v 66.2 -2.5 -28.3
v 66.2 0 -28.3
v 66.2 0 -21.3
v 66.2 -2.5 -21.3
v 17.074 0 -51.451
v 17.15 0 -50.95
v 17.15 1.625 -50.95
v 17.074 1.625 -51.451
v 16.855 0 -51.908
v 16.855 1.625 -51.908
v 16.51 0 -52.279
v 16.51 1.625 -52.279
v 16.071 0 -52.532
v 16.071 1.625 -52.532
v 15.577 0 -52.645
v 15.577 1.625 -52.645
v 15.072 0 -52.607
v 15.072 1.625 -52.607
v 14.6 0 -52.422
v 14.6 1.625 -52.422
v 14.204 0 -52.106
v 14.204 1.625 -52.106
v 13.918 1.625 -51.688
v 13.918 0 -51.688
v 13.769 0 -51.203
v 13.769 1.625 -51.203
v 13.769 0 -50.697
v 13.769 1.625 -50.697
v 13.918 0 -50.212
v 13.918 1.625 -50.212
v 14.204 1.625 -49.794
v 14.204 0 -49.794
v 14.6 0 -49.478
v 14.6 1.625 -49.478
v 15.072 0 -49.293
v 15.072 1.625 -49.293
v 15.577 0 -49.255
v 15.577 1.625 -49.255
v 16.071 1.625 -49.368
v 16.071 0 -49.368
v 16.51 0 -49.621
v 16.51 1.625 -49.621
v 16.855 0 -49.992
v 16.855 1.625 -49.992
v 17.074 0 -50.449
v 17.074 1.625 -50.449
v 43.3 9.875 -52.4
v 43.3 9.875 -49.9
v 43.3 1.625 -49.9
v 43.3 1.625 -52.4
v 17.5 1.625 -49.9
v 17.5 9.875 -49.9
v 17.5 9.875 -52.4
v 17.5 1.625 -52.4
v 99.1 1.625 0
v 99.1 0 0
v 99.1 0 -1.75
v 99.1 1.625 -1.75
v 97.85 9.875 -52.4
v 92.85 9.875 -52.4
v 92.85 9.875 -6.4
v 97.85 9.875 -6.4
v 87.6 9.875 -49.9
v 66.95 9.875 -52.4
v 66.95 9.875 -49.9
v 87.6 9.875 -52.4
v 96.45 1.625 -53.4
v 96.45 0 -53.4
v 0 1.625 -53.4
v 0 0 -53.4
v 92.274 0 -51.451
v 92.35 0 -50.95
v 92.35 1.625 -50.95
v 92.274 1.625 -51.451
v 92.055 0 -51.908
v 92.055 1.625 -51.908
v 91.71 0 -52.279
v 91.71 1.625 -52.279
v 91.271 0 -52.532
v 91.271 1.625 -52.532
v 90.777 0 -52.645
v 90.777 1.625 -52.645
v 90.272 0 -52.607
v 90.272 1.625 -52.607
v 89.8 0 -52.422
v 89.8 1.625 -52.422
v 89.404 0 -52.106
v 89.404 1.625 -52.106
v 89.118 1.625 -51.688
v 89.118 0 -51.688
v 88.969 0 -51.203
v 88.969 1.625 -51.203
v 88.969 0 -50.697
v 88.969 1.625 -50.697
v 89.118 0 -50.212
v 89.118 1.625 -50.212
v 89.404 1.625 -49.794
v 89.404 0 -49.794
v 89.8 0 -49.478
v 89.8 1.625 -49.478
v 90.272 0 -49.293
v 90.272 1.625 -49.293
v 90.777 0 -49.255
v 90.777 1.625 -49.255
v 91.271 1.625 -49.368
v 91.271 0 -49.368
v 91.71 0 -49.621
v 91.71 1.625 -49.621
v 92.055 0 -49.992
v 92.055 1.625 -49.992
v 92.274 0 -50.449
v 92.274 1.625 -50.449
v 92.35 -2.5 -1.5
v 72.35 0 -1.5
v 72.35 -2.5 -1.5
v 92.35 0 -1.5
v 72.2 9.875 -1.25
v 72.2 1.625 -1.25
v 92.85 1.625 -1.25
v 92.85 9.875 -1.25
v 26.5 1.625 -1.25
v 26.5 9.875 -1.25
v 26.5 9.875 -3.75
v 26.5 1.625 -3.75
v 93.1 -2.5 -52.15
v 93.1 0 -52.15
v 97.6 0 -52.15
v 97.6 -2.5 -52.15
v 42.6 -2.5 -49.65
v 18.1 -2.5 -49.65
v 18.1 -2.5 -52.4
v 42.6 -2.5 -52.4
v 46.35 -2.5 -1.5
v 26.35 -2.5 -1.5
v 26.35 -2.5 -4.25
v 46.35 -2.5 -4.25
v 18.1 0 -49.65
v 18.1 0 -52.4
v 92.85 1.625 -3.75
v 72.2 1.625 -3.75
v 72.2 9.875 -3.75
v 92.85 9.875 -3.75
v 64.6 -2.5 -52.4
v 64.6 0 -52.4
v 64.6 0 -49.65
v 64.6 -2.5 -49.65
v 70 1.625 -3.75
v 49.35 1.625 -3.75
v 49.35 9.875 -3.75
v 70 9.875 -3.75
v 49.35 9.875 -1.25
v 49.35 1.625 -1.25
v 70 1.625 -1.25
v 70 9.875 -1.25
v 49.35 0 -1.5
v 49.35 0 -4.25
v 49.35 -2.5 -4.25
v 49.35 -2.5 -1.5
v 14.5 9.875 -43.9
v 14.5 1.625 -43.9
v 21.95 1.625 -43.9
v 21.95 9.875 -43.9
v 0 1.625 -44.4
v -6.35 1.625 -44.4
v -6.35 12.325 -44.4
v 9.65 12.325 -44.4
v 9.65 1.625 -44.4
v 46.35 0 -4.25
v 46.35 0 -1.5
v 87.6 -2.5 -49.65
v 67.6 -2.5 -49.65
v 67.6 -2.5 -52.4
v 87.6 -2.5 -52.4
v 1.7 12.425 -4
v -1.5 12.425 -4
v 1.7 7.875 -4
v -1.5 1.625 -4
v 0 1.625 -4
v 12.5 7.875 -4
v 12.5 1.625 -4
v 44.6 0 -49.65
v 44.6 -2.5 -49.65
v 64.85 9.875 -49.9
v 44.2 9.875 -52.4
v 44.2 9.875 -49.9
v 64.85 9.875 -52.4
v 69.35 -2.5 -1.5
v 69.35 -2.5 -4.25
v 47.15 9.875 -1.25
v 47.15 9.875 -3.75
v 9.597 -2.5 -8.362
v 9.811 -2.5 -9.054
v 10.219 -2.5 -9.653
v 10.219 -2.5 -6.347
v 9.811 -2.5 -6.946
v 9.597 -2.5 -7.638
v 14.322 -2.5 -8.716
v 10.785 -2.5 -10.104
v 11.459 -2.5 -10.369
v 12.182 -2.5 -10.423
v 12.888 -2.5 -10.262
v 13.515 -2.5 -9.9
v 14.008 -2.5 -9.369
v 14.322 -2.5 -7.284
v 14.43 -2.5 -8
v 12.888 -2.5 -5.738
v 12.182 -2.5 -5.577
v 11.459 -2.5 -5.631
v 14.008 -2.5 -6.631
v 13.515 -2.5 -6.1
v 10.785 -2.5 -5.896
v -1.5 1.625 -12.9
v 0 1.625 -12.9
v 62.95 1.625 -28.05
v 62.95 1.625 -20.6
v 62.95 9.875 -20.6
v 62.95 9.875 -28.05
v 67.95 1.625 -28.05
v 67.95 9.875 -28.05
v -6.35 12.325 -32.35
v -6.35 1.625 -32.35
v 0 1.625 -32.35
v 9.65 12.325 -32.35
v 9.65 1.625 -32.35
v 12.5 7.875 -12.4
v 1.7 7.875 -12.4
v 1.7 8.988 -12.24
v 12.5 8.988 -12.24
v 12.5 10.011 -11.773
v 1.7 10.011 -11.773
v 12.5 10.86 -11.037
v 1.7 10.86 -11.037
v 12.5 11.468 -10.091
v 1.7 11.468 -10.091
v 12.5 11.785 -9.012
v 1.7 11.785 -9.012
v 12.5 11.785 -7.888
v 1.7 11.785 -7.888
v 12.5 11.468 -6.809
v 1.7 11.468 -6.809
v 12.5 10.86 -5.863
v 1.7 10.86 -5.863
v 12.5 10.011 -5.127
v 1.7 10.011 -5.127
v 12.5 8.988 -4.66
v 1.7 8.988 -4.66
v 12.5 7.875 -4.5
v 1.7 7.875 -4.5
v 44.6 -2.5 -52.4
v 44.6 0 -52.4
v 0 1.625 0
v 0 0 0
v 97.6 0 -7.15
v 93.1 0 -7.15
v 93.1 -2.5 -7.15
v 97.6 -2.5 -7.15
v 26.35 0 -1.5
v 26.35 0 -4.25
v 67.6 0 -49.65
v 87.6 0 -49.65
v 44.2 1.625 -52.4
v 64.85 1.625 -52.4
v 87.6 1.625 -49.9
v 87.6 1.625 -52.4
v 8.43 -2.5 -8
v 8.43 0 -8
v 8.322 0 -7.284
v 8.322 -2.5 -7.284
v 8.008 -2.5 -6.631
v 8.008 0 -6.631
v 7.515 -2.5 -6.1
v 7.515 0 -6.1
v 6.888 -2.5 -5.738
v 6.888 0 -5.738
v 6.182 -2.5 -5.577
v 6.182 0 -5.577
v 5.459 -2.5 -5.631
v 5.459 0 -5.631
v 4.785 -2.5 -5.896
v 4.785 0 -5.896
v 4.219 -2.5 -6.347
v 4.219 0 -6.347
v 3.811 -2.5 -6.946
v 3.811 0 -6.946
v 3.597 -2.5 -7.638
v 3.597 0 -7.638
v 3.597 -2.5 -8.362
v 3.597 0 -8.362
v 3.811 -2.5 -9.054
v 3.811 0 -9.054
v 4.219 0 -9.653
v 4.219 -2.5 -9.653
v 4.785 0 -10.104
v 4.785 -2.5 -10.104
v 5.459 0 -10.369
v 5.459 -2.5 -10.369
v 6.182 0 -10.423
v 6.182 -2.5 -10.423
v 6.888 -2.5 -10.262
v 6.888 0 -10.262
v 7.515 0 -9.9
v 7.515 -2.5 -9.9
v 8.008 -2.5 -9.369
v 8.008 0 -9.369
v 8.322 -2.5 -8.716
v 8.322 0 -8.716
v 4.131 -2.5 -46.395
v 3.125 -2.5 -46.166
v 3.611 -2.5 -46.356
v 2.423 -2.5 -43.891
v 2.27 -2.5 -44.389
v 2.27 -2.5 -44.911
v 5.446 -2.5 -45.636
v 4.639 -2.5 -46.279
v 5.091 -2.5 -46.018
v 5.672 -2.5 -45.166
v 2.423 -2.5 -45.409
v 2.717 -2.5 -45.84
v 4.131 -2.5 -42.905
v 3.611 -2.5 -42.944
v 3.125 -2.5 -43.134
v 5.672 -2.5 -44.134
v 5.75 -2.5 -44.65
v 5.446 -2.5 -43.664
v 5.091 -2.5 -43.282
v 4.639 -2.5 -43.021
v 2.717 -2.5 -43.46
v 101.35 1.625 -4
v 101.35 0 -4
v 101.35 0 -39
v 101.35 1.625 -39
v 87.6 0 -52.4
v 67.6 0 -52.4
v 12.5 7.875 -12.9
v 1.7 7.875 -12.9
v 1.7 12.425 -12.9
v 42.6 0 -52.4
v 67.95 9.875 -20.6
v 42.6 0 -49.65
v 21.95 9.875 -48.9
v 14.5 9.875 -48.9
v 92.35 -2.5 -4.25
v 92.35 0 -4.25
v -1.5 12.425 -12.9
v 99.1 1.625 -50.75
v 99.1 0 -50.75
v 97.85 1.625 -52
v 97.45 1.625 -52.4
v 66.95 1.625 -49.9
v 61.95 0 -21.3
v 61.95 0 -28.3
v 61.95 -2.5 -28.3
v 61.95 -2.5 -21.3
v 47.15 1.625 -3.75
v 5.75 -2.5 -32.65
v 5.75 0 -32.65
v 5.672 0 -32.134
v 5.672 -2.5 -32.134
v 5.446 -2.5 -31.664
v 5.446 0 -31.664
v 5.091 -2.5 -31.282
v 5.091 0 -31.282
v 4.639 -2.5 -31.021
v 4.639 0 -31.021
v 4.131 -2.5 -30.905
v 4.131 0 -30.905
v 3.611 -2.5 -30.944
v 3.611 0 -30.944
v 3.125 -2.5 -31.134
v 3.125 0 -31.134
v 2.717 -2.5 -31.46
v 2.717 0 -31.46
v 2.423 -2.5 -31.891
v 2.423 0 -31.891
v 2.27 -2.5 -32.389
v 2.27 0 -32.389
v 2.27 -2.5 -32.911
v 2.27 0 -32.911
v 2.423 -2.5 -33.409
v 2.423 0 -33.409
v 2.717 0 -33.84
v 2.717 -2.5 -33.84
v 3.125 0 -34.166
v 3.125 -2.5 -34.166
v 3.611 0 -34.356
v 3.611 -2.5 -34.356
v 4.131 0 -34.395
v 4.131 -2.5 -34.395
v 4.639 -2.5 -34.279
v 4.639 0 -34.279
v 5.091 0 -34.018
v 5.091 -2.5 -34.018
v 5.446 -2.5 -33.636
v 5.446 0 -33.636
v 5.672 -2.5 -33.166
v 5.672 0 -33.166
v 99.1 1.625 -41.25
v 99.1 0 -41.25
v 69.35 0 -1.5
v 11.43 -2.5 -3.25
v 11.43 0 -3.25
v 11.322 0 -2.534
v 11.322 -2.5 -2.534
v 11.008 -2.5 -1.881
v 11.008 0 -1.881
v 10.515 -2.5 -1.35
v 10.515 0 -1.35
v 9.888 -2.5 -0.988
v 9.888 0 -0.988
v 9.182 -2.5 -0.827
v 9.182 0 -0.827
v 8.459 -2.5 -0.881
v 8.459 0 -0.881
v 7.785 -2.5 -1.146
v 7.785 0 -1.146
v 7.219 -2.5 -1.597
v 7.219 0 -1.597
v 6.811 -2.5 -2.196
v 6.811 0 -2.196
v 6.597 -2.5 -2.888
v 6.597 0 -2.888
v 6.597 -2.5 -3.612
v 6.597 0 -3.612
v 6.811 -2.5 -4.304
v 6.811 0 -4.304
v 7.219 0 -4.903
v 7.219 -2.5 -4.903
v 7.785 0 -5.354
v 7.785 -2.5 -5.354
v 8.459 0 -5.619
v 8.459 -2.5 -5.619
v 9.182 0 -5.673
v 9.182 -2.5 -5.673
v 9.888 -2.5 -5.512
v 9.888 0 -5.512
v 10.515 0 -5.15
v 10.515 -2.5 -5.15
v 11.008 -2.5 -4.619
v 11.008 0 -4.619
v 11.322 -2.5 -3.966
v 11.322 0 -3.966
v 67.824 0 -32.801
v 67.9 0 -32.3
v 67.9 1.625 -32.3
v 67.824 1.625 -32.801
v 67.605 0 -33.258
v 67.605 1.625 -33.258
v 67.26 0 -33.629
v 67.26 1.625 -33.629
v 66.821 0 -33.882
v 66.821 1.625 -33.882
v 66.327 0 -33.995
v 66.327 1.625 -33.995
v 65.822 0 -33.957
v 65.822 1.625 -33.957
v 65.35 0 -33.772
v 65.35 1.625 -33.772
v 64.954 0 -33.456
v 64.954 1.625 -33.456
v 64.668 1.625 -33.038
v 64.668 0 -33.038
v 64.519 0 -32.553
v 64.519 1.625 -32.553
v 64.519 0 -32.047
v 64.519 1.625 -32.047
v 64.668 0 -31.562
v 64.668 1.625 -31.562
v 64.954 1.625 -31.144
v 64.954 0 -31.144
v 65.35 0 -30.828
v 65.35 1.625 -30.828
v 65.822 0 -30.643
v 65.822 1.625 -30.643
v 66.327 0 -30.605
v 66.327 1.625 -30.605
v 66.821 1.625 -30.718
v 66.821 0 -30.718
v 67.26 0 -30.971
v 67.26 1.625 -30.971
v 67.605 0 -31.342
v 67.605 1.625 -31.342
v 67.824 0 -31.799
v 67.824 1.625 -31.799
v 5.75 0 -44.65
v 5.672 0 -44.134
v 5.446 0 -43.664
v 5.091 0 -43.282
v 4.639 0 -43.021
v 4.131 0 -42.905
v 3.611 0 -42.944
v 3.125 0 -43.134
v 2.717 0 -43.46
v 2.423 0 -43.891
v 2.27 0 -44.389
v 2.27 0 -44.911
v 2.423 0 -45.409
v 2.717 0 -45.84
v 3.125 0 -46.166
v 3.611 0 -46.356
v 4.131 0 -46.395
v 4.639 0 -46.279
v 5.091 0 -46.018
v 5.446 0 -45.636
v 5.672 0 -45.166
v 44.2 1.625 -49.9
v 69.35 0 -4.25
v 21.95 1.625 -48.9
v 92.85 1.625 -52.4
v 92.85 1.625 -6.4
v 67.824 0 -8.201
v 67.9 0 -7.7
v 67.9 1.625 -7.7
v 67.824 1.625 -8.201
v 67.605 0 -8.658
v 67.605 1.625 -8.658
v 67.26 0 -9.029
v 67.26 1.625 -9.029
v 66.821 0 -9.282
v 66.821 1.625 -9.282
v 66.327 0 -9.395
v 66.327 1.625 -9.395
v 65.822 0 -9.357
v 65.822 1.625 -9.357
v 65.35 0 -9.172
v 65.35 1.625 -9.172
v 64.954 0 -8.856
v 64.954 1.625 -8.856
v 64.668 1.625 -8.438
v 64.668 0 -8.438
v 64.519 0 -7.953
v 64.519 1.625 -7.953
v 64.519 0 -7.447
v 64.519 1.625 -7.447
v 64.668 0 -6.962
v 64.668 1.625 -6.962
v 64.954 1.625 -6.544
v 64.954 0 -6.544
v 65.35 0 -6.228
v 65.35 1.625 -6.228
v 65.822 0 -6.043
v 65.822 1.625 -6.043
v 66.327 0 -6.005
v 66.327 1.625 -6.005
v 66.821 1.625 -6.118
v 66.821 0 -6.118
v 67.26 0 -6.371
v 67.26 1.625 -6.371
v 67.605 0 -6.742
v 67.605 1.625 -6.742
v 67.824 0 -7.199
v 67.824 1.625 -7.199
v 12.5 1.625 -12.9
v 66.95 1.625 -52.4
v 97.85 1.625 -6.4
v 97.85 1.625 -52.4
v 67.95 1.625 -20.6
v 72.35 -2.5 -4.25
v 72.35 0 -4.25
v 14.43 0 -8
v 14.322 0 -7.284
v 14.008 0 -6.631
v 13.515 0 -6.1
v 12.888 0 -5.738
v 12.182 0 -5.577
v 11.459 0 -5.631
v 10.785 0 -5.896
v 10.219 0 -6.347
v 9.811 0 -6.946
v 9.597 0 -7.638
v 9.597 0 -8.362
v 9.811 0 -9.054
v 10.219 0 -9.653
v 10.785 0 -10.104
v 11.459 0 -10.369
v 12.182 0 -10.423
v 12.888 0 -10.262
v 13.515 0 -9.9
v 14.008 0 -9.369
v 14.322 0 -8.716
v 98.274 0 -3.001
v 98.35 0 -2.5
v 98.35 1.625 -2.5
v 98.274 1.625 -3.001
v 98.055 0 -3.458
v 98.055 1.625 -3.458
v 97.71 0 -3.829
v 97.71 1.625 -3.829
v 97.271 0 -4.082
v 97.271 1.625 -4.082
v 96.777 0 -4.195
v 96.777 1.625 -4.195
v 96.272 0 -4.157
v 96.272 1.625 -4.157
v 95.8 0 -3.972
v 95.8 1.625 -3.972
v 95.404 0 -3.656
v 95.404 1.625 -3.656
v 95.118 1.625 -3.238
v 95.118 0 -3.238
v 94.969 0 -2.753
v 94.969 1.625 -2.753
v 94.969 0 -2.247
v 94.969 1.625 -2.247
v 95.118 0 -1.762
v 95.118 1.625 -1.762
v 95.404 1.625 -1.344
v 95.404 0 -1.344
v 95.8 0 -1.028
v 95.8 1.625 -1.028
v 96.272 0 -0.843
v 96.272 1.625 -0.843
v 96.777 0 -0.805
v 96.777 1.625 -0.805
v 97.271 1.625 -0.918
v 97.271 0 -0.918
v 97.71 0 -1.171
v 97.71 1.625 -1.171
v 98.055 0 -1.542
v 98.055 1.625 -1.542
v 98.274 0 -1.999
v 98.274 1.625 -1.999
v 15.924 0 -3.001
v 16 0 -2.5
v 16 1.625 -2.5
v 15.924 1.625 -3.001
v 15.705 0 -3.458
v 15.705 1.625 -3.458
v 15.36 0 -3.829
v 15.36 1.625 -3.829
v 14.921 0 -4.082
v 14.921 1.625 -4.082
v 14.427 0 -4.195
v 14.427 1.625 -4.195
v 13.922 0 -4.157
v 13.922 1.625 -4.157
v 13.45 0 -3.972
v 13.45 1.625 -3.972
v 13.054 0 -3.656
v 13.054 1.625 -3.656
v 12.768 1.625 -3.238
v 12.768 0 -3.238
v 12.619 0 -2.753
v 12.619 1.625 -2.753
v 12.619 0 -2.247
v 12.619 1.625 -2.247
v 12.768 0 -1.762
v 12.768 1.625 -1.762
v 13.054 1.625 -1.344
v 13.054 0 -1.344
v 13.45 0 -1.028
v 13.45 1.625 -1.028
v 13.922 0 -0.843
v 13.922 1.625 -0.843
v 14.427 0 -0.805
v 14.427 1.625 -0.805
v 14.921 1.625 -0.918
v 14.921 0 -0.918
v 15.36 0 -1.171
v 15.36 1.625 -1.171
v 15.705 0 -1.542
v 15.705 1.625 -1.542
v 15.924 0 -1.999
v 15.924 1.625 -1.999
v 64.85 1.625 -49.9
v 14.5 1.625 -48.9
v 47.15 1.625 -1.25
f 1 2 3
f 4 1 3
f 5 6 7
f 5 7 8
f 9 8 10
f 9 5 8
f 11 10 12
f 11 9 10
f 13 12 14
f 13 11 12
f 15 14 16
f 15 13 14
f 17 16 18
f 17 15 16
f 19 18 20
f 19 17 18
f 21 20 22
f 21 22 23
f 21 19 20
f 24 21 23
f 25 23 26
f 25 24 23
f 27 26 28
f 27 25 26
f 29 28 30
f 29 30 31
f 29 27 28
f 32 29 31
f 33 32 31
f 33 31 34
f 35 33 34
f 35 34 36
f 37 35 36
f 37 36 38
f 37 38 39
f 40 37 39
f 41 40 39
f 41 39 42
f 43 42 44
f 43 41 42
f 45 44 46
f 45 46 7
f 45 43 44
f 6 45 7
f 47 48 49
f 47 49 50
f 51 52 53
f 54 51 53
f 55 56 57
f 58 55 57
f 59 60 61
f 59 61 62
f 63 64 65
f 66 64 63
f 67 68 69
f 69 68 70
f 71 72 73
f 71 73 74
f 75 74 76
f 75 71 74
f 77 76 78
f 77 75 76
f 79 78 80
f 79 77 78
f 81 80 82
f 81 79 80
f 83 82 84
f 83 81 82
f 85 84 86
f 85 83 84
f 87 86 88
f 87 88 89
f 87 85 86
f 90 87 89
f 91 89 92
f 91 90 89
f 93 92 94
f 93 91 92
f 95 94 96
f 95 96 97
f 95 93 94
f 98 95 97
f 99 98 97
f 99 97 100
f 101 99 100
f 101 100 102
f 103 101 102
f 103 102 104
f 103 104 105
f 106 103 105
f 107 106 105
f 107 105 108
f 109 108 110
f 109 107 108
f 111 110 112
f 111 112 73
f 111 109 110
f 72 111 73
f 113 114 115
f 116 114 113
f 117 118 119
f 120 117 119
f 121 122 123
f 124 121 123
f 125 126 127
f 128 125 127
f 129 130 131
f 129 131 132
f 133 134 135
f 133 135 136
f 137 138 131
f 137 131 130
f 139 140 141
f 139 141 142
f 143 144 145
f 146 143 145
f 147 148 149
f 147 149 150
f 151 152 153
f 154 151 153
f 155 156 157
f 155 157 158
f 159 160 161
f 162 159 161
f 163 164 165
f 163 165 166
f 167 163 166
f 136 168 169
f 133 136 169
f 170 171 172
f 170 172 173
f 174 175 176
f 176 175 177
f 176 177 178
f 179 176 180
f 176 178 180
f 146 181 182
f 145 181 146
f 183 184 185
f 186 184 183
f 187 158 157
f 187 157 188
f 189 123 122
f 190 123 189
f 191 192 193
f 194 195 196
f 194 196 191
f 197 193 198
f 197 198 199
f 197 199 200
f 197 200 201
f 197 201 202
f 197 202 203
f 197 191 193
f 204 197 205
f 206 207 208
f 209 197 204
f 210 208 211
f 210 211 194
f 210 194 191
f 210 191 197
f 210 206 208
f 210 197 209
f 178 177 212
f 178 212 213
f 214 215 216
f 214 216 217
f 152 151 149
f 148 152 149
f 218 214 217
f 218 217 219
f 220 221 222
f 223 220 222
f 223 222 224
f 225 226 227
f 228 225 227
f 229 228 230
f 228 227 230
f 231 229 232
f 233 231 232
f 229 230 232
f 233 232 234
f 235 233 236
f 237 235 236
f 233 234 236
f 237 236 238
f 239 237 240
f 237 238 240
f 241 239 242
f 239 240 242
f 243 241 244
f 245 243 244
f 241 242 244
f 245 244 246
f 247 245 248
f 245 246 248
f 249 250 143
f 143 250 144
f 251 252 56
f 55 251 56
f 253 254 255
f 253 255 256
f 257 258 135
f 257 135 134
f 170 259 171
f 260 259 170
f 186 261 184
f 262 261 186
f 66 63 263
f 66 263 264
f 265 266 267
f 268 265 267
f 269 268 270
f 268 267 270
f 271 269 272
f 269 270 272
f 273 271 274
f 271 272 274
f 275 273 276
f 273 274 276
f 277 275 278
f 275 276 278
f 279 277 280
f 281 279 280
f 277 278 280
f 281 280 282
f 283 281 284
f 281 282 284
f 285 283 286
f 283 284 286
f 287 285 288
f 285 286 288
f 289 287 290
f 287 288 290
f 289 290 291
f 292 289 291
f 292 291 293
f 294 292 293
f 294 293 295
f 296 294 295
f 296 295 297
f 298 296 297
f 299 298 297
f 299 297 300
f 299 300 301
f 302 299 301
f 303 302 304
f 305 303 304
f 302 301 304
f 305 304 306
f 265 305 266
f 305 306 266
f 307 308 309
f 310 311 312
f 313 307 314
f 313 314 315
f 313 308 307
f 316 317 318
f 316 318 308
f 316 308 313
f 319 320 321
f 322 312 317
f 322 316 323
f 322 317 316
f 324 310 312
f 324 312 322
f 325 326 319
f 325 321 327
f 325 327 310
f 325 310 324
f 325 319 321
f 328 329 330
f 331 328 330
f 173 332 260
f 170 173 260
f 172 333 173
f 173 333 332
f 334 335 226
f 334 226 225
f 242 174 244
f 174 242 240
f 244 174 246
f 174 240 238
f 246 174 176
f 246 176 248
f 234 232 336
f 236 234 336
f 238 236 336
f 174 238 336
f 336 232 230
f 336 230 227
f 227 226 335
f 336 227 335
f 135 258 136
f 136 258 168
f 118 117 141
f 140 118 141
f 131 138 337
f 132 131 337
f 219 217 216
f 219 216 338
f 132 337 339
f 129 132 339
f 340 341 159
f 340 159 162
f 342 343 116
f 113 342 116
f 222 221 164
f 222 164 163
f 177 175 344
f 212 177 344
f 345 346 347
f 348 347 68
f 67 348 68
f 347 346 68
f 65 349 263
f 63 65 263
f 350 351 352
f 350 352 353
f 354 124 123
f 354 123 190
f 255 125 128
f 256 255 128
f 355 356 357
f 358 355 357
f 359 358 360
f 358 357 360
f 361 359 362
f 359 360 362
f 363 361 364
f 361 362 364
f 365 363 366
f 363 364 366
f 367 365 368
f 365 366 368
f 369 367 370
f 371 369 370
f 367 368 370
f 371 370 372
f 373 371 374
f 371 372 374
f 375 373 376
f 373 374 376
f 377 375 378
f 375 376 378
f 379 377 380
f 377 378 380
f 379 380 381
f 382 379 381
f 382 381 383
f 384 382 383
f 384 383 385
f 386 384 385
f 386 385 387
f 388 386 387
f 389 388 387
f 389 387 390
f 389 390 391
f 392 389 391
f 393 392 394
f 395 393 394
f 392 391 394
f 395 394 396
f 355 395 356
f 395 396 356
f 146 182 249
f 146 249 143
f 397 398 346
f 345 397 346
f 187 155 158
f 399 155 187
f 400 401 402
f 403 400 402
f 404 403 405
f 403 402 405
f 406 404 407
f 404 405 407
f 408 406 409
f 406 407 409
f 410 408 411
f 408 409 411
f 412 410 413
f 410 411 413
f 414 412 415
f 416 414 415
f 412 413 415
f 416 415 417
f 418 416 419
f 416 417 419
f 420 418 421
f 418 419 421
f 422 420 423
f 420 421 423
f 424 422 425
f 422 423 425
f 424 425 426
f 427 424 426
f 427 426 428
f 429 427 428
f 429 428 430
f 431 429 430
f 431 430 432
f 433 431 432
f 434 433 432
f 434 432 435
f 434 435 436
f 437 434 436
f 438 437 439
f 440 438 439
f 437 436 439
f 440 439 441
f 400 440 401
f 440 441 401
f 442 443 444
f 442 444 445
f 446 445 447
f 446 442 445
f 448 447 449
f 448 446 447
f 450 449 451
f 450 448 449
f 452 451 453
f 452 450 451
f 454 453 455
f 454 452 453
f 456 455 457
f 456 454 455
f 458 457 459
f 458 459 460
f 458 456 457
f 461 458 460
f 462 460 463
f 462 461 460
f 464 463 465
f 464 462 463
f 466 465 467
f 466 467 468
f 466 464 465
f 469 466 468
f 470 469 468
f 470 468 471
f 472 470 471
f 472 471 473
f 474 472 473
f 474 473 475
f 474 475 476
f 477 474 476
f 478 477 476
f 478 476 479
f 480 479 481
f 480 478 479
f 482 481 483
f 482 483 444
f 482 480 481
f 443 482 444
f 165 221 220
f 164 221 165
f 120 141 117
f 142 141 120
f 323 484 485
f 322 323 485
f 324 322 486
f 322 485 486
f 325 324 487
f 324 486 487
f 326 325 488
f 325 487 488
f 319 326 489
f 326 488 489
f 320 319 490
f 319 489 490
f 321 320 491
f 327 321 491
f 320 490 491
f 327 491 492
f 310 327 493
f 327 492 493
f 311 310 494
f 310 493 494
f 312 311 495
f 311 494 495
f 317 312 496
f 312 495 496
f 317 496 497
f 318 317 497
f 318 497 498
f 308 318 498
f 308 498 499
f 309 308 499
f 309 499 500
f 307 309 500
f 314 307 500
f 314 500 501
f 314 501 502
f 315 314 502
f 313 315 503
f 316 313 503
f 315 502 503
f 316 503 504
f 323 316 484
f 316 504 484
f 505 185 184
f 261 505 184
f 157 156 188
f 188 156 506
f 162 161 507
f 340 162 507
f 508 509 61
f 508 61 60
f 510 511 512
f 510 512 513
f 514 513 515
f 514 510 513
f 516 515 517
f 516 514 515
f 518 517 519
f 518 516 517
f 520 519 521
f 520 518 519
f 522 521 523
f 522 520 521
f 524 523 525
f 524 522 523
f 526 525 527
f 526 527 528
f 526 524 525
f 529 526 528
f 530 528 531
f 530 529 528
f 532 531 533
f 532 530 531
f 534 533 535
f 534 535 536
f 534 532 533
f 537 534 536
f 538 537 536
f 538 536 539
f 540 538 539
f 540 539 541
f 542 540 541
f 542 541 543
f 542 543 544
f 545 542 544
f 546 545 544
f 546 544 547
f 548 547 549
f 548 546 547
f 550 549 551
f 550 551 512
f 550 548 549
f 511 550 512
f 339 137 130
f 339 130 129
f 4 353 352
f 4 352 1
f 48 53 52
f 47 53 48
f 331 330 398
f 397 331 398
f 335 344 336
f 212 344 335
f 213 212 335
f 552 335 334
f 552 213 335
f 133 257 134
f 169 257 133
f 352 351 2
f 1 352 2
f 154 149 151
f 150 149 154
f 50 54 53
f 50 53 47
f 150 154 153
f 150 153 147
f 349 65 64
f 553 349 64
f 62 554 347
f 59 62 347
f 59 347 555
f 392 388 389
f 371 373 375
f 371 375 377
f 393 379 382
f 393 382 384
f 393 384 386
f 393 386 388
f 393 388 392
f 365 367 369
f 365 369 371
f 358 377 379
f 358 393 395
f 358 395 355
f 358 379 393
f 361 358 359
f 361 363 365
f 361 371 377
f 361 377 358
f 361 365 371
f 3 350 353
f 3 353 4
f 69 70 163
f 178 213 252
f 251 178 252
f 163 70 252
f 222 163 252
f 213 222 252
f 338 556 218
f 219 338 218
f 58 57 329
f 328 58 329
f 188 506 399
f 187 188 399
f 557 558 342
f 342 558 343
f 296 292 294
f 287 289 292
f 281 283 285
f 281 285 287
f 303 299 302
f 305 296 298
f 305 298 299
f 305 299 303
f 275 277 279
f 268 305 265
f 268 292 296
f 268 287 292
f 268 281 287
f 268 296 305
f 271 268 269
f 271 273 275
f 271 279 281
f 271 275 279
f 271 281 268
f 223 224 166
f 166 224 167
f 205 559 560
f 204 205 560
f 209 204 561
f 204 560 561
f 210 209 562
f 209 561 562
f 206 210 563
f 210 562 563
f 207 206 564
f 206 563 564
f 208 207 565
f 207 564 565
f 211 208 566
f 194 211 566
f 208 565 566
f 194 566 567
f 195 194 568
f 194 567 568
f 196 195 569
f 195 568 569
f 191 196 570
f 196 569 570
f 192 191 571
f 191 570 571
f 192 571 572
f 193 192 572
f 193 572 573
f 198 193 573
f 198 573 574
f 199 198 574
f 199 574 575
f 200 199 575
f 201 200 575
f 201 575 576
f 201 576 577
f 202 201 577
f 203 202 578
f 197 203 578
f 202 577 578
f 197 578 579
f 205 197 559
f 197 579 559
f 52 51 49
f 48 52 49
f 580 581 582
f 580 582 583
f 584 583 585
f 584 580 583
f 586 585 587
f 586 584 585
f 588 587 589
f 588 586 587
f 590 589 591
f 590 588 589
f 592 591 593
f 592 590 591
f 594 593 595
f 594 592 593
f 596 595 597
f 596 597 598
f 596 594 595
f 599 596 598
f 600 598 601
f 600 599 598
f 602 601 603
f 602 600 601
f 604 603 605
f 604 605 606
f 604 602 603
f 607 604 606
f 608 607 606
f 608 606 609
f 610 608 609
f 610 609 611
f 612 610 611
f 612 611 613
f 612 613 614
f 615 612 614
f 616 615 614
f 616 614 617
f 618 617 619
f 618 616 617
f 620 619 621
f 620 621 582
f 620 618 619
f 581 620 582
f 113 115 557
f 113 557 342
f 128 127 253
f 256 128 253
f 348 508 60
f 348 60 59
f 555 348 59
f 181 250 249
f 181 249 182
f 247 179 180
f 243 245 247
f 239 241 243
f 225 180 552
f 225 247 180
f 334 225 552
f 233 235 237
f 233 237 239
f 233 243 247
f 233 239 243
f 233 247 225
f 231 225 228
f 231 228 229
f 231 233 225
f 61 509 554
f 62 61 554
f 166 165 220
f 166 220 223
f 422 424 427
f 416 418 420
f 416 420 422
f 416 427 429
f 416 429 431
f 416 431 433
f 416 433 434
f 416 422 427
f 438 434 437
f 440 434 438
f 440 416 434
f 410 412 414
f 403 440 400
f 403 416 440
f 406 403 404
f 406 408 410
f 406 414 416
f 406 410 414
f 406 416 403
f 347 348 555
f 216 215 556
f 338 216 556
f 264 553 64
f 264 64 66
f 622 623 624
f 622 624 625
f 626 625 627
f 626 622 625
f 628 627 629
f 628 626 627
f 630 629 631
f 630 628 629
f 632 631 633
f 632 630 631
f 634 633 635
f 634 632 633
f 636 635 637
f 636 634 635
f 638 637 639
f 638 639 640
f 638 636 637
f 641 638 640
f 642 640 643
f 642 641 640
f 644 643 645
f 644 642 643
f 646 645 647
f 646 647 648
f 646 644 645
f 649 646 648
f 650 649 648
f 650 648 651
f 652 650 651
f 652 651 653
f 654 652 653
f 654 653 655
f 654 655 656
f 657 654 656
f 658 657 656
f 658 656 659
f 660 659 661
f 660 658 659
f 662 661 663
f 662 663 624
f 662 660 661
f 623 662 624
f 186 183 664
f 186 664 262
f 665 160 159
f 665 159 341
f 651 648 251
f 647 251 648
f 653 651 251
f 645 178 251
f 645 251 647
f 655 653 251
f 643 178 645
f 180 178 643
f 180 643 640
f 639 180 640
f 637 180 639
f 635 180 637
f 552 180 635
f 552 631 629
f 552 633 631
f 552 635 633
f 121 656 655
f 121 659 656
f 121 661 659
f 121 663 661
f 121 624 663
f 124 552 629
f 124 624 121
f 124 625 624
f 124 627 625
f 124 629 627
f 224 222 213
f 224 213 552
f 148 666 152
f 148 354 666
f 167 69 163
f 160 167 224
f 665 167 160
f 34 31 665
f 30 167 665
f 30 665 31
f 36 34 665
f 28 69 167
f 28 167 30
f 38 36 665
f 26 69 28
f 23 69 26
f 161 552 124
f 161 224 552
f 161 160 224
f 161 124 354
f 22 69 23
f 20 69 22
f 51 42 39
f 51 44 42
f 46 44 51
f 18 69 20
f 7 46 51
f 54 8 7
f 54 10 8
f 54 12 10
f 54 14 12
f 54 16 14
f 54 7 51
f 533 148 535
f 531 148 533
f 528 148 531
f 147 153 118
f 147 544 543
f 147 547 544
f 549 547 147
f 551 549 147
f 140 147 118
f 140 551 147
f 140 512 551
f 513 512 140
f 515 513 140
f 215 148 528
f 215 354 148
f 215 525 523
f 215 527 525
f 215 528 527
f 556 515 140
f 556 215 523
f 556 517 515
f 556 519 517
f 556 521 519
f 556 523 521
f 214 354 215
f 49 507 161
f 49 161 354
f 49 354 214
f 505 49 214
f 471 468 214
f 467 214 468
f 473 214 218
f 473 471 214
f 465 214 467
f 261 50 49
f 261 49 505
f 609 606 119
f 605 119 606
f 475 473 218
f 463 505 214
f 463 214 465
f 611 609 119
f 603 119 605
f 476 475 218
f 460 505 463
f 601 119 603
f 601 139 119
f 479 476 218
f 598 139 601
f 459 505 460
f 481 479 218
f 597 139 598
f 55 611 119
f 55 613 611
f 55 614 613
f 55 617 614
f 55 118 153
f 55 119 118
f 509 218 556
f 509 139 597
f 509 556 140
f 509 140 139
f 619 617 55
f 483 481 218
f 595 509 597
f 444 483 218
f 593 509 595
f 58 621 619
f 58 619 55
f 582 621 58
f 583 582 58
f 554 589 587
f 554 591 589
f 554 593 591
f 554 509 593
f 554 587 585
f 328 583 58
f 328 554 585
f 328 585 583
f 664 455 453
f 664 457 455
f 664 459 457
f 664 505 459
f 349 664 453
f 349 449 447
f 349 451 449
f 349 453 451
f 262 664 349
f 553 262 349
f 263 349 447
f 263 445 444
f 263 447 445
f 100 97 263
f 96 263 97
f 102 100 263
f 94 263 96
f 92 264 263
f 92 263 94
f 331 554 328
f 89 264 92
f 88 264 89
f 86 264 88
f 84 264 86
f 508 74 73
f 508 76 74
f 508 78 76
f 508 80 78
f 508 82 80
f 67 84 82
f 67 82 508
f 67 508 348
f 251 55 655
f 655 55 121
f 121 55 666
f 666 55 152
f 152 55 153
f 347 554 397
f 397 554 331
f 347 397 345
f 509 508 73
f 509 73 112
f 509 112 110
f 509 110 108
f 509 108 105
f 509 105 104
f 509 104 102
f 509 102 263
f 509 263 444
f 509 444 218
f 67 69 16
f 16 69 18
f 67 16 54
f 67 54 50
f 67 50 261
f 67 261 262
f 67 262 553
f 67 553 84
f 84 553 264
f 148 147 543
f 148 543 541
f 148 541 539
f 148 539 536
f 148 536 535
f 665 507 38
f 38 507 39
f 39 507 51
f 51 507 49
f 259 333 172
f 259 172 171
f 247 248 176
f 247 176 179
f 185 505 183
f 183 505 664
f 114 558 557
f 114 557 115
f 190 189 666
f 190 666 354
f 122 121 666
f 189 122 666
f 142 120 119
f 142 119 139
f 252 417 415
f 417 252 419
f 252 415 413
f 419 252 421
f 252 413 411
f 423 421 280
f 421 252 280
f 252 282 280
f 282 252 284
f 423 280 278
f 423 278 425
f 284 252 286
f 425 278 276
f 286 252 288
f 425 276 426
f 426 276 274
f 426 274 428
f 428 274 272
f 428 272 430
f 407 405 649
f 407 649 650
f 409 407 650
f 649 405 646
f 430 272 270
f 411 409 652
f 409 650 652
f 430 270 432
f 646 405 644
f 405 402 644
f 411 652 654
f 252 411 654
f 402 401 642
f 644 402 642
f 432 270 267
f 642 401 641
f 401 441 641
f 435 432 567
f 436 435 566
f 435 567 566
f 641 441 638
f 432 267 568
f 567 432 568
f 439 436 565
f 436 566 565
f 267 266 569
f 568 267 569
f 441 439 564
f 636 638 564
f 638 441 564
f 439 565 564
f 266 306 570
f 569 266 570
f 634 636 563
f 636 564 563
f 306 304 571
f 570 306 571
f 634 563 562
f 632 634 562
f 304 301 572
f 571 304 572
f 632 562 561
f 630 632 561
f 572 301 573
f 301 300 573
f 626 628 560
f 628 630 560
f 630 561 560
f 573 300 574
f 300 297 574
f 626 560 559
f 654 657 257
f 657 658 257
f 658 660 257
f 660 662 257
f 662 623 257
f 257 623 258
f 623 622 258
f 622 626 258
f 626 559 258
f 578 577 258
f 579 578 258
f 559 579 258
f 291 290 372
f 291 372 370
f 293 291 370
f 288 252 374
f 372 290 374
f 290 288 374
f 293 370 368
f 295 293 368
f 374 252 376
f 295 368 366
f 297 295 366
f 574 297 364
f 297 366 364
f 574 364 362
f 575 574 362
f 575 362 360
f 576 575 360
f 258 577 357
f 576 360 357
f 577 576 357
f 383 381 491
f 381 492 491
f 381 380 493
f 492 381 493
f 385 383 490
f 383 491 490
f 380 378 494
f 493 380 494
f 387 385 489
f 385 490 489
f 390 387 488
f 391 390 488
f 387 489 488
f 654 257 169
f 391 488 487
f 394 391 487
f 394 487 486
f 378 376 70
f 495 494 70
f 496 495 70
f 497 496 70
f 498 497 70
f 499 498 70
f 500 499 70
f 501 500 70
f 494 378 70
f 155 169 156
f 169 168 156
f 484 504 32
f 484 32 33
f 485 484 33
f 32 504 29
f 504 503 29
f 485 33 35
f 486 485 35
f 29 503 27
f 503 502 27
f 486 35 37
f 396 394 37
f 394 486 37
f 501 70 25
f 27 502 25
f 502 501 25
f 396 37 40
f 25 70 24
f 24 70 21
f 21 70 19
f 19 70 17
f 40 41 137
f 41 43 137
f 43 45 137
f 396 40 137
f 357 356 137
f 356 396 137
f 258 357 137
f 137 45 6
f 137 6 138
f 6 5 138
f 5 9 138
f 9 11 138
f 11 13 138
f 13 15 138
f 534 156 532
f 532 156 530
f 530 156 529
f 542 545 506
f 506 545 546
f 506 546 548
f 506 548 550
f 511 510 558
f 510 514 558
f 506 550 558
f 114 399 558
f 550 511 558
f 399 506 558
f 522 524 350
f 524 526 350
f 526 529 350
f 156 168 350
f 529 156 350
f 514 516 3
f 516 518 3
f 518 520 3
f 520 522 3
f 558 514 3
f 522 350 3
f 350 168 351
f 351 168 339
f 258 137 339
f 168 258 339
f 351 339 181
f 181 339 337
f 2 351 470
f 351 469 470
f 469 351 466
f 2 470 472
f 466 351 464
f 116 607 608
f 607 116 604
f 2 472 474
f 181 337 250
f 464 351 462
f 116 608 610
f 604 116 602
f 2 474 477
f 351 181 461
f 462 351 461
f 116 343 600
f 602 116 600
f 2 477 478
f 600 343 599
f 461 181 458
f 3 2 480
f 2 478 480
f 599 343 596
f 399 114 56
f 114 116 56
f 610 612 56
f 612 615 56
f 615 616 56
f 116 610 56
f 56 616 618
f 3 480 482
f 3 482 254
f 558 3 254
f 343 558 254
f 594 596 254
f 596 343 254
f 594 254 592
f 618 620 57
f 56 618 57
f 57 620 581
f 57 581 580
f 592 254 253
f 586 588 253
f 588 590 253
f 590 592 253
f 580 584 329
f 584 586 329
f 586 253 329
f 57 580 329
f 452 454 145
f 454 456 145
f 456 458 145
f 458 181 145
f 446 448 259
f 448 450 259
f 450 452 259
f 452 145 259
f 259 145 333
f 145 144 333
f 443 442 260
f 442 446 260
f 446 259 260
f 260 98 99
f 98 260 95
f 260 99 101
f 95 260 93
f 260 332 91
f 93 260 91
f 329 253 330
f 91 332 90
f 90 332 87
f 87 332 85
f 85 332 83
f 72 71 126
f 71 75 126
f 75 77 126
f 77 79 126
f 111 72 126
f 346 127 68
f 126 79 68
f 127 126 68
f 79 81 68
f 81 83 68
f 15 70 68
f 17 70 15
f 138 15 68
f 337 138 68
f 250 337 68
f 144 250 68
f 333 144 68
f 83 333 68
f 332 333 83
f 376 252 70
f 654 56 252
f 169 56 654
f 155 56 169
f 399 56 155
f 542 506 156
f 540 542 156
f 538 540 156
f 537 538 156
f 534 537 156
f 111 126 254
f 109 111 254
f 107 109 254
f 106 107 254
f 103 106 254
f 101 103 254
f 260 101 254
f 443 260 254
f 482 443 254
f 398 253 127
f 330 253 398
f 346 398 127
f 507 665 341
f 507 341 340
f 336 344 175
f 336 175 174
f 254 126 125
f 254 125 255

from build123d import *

# Parameters (mm, degrees)
SKETCH2_R           = 1.7
BOSS_EXTRUDE1_DEPTH = 1.625
SKETCH3_W           = 16
SKETCH3_H           = 12.05
BOSS_EXTRUDE2_DEPTH = 10.7
SKETCH4_W           = 14
SKETCH4_H           = 8.9
BOSS_EXTRUDE3_DEPTH = 6.25
SKETCH5_W           = 3.2
SKETCH5_H           = 8.9
BOSS_EXTRUDE4_DEPTH = 4.55
SKETCH6_R           = 3.95
BOSS_EXTRUDE5_DEPTH = 10.8
SKETCH7_R           = 2.43
SKETCH7_R_2         = 1.75
SKETCH7_W           = 4.5
SKETCH7_H           = 45
SKETCH7_W_2         = 20
SKETCH7_H_2         = 2.75
SKETCH7_W_3         = 24.5
SKETCH7_W_4         = 4.25
SKETCH7_H_3         = 7
BOSS_EXTRUDE6_DEPTH = 2.5
SKETCH8_W           = 25.8
SKETCH8_H           = 2.5
SKETCH8_W_2         = 20.65
SKETCH8_W_3         = 5
SKETCH8_H_2         = 46
SKETCH8_H_3         = 7.45
SKETCH8_W_4         = 7.45
SKETCH8_H_4         = 5
BOSS_EXTRUDE7_DEPTH = 8.25


with BuildPart() as part:
    # Sketch2 → Boss-Extrude1 (new body)
    with BuildSketch(Plane(origin=(0, 0, 0), x_dir=(1, 0, 0), z_dir=(0, 1, 0))):
        Polygon((99.1, 0), (99.1, 1.75), (101.35, 4), (101.35, 39), (99.1, 41.25), (99.1, 50.75), (96.45, 53.4), (0, 53.4), (0, 0), align=None)
        with Locations((96.65, 2.5)):
            Circle(SKETCH2_R, mode=Mode.SUBTRACT)
        with Locations((90.65, 50.95)):
            Circle(SKETCH2_R, mode=Mode.SUBTRACT)
        with Locations((15.45, 50.95)):
            Circle(SKETCH2_R, mode=Mode.SUBTRACT)
        with Locations((14.3, 2.5)):
            Circle(SKETCH2_R, mode=Mode.SUBTRACT)
        with Locations((66.2, 32.3)):
            Circle(SKETCH2_R, mode=Mode.SUBTRACT)
        with Locations((66.2, 7.7)):
            Circle(SKETCH2_R, mode=Mode.SUBTRACT)
    extrude(amount=BOSS_EXTRUDE1_DEPTH)

    # Sketch3 → Boss-Extrude2 (add)
    with BuildSketch(Plane(origin=(0, 1.625, 0), x_dir=(1, 0, 0), z_dir=(0, 1, 0))):
        with Locations((1.65, 38.375)):
            Rectangle(SKETCH3_W, SKETCH3_H)
    extrude(amount=BOSS_EXTRUDE2_DEPTH)

    # Sketch4 → Boss-Extrude3 (add)
    with BuildSketch(Plane(origin=(0, 1.625, 0), x_dir=(1, 0, 0), z_dir=(0, 1, 0))):
        with Locations((5.5, 8.45)):
            Rectangle(SKETCH4_W, SKETCH4_H)
    extrude(amount=BOSS_EXTRUDE3_DEPTH)

    # Sketch5 → Boss-Extrude4 (add)
    with BuildSketch(Plane(origin=(0, 7.875, 0), x_dir=(1, 0, 0), z_dir=(0, 1, 0))):
        with Locations((0.1, 8.45)):
            Rectangle(SKETCH5_W, SKETCH5_H)
    extrude(amount=BOSS_EXTRUDE4_DEPTH)

    # Sketch6 → Boss-Extrude5 (add)
    with BuildSketch(Plane(origin=(1.7, 0, 0), x_dir=(0, 0, -1), z_dir=(1, 0, 0))):
        with Locations((8.45, 7.875)):
            Circle(SKETCH6_R)
    extrude(amount=BOSS_EXTRUDE5_DEPTH)

    # Sketch7 → Boss-Extrude6 (add)
    with BuildSketch(Plane.XZ):
        with Locations((9, -3.25)):
            Circle(SKETCH7_R)
        with Locations((6, -8)):
            Circle(SKETCH7_R)
        with Locations((12, -8)):
            Circle(SKETCH7_R)
        with Locations((4, -32.65)):
            Circle(SKETCH7_R_2)
        with Locations((4, -44.65)):
            Circle(SKETCH7_R_2)
        with Locations((95.35, -29.65)):
            Rectangle(SKETCH7_W, SKETCH7_H)
        with Locations((77.6, -51.025)):
            Rectangle(SKETCH7_W_2, SKETCH7_H_2)
        with Locations((54.6, -51.025)):
            Rectangle(SKETCH7_W_2, SKETCH7_H_2)
        with Locations((30.35, -51.025)):
            Rectangle(SKETCH7_W_3, SKETCH7_H_2)
        with Locations((82.35, -2.875)):
            Rectangle(SKETCH7_W_2, SKETCH7_H_2)
        with Locations((59.35, -2.875)):
            Rectangle(SKETCH7_W_2, SKETCH7_H_2)
        with Locations((36.35, -2.875)):
            Rectangle(SKETCH7_W_2, SKETCH7_H_2)
        with Locations((64.075, -24.8)):
            Rectangle(SKETCH7_W_4, SKETCH7_H_3)
    extrude(amount=BOSS_EXTRUDE6_DEPTH)

    # Sketch8 → Boss-Extrude7 (add)
    with BuildSketch(Plane(origin=(0, 1.625, 0), x_dir=(1, 0, 0), z_dir=(0, 1, 0))):
        with Locations((30.4, 51.15)):
            Rectangle(SKETCH8_W, SKETCH8_H)
        with Locations((54.525, 51.15)):
            Rectangle(SKETCH8_W_2, SKETCH8_H)
        with Locations((77.275, 51.15)):
            Rectangle(SKETCH8_W_2, SKETCH8_H)
        with Locations((95.35, 29.4)):
            Rectangle(SKETCH8_W_3, SKETCH8_H_2)
        with Locations((36.825, 2.5)):
            Rectangle(SKETCH8_W_2, SKETCH8_H)
        with Locations((59.675, 2.5)):
            Rectangle(SKETCH8_W_2, SKETCH8_H)
        with Locations((82.525, 2.5)):
            Rectangle(SKETCH8_W_2, SKETCH8_H)
        with Locations((65.45, 24.325)):
            Rectangle(SKETCH8_W_3, SKETCH8_H_3)
        with Locations((18.225, 46.4)):
            Rectangle(SKETCH8_W_4, SKETCH8_H_4)
    extrude(amount=BOSS_EXTRUDE7_DEPTH)


solid = part.part
